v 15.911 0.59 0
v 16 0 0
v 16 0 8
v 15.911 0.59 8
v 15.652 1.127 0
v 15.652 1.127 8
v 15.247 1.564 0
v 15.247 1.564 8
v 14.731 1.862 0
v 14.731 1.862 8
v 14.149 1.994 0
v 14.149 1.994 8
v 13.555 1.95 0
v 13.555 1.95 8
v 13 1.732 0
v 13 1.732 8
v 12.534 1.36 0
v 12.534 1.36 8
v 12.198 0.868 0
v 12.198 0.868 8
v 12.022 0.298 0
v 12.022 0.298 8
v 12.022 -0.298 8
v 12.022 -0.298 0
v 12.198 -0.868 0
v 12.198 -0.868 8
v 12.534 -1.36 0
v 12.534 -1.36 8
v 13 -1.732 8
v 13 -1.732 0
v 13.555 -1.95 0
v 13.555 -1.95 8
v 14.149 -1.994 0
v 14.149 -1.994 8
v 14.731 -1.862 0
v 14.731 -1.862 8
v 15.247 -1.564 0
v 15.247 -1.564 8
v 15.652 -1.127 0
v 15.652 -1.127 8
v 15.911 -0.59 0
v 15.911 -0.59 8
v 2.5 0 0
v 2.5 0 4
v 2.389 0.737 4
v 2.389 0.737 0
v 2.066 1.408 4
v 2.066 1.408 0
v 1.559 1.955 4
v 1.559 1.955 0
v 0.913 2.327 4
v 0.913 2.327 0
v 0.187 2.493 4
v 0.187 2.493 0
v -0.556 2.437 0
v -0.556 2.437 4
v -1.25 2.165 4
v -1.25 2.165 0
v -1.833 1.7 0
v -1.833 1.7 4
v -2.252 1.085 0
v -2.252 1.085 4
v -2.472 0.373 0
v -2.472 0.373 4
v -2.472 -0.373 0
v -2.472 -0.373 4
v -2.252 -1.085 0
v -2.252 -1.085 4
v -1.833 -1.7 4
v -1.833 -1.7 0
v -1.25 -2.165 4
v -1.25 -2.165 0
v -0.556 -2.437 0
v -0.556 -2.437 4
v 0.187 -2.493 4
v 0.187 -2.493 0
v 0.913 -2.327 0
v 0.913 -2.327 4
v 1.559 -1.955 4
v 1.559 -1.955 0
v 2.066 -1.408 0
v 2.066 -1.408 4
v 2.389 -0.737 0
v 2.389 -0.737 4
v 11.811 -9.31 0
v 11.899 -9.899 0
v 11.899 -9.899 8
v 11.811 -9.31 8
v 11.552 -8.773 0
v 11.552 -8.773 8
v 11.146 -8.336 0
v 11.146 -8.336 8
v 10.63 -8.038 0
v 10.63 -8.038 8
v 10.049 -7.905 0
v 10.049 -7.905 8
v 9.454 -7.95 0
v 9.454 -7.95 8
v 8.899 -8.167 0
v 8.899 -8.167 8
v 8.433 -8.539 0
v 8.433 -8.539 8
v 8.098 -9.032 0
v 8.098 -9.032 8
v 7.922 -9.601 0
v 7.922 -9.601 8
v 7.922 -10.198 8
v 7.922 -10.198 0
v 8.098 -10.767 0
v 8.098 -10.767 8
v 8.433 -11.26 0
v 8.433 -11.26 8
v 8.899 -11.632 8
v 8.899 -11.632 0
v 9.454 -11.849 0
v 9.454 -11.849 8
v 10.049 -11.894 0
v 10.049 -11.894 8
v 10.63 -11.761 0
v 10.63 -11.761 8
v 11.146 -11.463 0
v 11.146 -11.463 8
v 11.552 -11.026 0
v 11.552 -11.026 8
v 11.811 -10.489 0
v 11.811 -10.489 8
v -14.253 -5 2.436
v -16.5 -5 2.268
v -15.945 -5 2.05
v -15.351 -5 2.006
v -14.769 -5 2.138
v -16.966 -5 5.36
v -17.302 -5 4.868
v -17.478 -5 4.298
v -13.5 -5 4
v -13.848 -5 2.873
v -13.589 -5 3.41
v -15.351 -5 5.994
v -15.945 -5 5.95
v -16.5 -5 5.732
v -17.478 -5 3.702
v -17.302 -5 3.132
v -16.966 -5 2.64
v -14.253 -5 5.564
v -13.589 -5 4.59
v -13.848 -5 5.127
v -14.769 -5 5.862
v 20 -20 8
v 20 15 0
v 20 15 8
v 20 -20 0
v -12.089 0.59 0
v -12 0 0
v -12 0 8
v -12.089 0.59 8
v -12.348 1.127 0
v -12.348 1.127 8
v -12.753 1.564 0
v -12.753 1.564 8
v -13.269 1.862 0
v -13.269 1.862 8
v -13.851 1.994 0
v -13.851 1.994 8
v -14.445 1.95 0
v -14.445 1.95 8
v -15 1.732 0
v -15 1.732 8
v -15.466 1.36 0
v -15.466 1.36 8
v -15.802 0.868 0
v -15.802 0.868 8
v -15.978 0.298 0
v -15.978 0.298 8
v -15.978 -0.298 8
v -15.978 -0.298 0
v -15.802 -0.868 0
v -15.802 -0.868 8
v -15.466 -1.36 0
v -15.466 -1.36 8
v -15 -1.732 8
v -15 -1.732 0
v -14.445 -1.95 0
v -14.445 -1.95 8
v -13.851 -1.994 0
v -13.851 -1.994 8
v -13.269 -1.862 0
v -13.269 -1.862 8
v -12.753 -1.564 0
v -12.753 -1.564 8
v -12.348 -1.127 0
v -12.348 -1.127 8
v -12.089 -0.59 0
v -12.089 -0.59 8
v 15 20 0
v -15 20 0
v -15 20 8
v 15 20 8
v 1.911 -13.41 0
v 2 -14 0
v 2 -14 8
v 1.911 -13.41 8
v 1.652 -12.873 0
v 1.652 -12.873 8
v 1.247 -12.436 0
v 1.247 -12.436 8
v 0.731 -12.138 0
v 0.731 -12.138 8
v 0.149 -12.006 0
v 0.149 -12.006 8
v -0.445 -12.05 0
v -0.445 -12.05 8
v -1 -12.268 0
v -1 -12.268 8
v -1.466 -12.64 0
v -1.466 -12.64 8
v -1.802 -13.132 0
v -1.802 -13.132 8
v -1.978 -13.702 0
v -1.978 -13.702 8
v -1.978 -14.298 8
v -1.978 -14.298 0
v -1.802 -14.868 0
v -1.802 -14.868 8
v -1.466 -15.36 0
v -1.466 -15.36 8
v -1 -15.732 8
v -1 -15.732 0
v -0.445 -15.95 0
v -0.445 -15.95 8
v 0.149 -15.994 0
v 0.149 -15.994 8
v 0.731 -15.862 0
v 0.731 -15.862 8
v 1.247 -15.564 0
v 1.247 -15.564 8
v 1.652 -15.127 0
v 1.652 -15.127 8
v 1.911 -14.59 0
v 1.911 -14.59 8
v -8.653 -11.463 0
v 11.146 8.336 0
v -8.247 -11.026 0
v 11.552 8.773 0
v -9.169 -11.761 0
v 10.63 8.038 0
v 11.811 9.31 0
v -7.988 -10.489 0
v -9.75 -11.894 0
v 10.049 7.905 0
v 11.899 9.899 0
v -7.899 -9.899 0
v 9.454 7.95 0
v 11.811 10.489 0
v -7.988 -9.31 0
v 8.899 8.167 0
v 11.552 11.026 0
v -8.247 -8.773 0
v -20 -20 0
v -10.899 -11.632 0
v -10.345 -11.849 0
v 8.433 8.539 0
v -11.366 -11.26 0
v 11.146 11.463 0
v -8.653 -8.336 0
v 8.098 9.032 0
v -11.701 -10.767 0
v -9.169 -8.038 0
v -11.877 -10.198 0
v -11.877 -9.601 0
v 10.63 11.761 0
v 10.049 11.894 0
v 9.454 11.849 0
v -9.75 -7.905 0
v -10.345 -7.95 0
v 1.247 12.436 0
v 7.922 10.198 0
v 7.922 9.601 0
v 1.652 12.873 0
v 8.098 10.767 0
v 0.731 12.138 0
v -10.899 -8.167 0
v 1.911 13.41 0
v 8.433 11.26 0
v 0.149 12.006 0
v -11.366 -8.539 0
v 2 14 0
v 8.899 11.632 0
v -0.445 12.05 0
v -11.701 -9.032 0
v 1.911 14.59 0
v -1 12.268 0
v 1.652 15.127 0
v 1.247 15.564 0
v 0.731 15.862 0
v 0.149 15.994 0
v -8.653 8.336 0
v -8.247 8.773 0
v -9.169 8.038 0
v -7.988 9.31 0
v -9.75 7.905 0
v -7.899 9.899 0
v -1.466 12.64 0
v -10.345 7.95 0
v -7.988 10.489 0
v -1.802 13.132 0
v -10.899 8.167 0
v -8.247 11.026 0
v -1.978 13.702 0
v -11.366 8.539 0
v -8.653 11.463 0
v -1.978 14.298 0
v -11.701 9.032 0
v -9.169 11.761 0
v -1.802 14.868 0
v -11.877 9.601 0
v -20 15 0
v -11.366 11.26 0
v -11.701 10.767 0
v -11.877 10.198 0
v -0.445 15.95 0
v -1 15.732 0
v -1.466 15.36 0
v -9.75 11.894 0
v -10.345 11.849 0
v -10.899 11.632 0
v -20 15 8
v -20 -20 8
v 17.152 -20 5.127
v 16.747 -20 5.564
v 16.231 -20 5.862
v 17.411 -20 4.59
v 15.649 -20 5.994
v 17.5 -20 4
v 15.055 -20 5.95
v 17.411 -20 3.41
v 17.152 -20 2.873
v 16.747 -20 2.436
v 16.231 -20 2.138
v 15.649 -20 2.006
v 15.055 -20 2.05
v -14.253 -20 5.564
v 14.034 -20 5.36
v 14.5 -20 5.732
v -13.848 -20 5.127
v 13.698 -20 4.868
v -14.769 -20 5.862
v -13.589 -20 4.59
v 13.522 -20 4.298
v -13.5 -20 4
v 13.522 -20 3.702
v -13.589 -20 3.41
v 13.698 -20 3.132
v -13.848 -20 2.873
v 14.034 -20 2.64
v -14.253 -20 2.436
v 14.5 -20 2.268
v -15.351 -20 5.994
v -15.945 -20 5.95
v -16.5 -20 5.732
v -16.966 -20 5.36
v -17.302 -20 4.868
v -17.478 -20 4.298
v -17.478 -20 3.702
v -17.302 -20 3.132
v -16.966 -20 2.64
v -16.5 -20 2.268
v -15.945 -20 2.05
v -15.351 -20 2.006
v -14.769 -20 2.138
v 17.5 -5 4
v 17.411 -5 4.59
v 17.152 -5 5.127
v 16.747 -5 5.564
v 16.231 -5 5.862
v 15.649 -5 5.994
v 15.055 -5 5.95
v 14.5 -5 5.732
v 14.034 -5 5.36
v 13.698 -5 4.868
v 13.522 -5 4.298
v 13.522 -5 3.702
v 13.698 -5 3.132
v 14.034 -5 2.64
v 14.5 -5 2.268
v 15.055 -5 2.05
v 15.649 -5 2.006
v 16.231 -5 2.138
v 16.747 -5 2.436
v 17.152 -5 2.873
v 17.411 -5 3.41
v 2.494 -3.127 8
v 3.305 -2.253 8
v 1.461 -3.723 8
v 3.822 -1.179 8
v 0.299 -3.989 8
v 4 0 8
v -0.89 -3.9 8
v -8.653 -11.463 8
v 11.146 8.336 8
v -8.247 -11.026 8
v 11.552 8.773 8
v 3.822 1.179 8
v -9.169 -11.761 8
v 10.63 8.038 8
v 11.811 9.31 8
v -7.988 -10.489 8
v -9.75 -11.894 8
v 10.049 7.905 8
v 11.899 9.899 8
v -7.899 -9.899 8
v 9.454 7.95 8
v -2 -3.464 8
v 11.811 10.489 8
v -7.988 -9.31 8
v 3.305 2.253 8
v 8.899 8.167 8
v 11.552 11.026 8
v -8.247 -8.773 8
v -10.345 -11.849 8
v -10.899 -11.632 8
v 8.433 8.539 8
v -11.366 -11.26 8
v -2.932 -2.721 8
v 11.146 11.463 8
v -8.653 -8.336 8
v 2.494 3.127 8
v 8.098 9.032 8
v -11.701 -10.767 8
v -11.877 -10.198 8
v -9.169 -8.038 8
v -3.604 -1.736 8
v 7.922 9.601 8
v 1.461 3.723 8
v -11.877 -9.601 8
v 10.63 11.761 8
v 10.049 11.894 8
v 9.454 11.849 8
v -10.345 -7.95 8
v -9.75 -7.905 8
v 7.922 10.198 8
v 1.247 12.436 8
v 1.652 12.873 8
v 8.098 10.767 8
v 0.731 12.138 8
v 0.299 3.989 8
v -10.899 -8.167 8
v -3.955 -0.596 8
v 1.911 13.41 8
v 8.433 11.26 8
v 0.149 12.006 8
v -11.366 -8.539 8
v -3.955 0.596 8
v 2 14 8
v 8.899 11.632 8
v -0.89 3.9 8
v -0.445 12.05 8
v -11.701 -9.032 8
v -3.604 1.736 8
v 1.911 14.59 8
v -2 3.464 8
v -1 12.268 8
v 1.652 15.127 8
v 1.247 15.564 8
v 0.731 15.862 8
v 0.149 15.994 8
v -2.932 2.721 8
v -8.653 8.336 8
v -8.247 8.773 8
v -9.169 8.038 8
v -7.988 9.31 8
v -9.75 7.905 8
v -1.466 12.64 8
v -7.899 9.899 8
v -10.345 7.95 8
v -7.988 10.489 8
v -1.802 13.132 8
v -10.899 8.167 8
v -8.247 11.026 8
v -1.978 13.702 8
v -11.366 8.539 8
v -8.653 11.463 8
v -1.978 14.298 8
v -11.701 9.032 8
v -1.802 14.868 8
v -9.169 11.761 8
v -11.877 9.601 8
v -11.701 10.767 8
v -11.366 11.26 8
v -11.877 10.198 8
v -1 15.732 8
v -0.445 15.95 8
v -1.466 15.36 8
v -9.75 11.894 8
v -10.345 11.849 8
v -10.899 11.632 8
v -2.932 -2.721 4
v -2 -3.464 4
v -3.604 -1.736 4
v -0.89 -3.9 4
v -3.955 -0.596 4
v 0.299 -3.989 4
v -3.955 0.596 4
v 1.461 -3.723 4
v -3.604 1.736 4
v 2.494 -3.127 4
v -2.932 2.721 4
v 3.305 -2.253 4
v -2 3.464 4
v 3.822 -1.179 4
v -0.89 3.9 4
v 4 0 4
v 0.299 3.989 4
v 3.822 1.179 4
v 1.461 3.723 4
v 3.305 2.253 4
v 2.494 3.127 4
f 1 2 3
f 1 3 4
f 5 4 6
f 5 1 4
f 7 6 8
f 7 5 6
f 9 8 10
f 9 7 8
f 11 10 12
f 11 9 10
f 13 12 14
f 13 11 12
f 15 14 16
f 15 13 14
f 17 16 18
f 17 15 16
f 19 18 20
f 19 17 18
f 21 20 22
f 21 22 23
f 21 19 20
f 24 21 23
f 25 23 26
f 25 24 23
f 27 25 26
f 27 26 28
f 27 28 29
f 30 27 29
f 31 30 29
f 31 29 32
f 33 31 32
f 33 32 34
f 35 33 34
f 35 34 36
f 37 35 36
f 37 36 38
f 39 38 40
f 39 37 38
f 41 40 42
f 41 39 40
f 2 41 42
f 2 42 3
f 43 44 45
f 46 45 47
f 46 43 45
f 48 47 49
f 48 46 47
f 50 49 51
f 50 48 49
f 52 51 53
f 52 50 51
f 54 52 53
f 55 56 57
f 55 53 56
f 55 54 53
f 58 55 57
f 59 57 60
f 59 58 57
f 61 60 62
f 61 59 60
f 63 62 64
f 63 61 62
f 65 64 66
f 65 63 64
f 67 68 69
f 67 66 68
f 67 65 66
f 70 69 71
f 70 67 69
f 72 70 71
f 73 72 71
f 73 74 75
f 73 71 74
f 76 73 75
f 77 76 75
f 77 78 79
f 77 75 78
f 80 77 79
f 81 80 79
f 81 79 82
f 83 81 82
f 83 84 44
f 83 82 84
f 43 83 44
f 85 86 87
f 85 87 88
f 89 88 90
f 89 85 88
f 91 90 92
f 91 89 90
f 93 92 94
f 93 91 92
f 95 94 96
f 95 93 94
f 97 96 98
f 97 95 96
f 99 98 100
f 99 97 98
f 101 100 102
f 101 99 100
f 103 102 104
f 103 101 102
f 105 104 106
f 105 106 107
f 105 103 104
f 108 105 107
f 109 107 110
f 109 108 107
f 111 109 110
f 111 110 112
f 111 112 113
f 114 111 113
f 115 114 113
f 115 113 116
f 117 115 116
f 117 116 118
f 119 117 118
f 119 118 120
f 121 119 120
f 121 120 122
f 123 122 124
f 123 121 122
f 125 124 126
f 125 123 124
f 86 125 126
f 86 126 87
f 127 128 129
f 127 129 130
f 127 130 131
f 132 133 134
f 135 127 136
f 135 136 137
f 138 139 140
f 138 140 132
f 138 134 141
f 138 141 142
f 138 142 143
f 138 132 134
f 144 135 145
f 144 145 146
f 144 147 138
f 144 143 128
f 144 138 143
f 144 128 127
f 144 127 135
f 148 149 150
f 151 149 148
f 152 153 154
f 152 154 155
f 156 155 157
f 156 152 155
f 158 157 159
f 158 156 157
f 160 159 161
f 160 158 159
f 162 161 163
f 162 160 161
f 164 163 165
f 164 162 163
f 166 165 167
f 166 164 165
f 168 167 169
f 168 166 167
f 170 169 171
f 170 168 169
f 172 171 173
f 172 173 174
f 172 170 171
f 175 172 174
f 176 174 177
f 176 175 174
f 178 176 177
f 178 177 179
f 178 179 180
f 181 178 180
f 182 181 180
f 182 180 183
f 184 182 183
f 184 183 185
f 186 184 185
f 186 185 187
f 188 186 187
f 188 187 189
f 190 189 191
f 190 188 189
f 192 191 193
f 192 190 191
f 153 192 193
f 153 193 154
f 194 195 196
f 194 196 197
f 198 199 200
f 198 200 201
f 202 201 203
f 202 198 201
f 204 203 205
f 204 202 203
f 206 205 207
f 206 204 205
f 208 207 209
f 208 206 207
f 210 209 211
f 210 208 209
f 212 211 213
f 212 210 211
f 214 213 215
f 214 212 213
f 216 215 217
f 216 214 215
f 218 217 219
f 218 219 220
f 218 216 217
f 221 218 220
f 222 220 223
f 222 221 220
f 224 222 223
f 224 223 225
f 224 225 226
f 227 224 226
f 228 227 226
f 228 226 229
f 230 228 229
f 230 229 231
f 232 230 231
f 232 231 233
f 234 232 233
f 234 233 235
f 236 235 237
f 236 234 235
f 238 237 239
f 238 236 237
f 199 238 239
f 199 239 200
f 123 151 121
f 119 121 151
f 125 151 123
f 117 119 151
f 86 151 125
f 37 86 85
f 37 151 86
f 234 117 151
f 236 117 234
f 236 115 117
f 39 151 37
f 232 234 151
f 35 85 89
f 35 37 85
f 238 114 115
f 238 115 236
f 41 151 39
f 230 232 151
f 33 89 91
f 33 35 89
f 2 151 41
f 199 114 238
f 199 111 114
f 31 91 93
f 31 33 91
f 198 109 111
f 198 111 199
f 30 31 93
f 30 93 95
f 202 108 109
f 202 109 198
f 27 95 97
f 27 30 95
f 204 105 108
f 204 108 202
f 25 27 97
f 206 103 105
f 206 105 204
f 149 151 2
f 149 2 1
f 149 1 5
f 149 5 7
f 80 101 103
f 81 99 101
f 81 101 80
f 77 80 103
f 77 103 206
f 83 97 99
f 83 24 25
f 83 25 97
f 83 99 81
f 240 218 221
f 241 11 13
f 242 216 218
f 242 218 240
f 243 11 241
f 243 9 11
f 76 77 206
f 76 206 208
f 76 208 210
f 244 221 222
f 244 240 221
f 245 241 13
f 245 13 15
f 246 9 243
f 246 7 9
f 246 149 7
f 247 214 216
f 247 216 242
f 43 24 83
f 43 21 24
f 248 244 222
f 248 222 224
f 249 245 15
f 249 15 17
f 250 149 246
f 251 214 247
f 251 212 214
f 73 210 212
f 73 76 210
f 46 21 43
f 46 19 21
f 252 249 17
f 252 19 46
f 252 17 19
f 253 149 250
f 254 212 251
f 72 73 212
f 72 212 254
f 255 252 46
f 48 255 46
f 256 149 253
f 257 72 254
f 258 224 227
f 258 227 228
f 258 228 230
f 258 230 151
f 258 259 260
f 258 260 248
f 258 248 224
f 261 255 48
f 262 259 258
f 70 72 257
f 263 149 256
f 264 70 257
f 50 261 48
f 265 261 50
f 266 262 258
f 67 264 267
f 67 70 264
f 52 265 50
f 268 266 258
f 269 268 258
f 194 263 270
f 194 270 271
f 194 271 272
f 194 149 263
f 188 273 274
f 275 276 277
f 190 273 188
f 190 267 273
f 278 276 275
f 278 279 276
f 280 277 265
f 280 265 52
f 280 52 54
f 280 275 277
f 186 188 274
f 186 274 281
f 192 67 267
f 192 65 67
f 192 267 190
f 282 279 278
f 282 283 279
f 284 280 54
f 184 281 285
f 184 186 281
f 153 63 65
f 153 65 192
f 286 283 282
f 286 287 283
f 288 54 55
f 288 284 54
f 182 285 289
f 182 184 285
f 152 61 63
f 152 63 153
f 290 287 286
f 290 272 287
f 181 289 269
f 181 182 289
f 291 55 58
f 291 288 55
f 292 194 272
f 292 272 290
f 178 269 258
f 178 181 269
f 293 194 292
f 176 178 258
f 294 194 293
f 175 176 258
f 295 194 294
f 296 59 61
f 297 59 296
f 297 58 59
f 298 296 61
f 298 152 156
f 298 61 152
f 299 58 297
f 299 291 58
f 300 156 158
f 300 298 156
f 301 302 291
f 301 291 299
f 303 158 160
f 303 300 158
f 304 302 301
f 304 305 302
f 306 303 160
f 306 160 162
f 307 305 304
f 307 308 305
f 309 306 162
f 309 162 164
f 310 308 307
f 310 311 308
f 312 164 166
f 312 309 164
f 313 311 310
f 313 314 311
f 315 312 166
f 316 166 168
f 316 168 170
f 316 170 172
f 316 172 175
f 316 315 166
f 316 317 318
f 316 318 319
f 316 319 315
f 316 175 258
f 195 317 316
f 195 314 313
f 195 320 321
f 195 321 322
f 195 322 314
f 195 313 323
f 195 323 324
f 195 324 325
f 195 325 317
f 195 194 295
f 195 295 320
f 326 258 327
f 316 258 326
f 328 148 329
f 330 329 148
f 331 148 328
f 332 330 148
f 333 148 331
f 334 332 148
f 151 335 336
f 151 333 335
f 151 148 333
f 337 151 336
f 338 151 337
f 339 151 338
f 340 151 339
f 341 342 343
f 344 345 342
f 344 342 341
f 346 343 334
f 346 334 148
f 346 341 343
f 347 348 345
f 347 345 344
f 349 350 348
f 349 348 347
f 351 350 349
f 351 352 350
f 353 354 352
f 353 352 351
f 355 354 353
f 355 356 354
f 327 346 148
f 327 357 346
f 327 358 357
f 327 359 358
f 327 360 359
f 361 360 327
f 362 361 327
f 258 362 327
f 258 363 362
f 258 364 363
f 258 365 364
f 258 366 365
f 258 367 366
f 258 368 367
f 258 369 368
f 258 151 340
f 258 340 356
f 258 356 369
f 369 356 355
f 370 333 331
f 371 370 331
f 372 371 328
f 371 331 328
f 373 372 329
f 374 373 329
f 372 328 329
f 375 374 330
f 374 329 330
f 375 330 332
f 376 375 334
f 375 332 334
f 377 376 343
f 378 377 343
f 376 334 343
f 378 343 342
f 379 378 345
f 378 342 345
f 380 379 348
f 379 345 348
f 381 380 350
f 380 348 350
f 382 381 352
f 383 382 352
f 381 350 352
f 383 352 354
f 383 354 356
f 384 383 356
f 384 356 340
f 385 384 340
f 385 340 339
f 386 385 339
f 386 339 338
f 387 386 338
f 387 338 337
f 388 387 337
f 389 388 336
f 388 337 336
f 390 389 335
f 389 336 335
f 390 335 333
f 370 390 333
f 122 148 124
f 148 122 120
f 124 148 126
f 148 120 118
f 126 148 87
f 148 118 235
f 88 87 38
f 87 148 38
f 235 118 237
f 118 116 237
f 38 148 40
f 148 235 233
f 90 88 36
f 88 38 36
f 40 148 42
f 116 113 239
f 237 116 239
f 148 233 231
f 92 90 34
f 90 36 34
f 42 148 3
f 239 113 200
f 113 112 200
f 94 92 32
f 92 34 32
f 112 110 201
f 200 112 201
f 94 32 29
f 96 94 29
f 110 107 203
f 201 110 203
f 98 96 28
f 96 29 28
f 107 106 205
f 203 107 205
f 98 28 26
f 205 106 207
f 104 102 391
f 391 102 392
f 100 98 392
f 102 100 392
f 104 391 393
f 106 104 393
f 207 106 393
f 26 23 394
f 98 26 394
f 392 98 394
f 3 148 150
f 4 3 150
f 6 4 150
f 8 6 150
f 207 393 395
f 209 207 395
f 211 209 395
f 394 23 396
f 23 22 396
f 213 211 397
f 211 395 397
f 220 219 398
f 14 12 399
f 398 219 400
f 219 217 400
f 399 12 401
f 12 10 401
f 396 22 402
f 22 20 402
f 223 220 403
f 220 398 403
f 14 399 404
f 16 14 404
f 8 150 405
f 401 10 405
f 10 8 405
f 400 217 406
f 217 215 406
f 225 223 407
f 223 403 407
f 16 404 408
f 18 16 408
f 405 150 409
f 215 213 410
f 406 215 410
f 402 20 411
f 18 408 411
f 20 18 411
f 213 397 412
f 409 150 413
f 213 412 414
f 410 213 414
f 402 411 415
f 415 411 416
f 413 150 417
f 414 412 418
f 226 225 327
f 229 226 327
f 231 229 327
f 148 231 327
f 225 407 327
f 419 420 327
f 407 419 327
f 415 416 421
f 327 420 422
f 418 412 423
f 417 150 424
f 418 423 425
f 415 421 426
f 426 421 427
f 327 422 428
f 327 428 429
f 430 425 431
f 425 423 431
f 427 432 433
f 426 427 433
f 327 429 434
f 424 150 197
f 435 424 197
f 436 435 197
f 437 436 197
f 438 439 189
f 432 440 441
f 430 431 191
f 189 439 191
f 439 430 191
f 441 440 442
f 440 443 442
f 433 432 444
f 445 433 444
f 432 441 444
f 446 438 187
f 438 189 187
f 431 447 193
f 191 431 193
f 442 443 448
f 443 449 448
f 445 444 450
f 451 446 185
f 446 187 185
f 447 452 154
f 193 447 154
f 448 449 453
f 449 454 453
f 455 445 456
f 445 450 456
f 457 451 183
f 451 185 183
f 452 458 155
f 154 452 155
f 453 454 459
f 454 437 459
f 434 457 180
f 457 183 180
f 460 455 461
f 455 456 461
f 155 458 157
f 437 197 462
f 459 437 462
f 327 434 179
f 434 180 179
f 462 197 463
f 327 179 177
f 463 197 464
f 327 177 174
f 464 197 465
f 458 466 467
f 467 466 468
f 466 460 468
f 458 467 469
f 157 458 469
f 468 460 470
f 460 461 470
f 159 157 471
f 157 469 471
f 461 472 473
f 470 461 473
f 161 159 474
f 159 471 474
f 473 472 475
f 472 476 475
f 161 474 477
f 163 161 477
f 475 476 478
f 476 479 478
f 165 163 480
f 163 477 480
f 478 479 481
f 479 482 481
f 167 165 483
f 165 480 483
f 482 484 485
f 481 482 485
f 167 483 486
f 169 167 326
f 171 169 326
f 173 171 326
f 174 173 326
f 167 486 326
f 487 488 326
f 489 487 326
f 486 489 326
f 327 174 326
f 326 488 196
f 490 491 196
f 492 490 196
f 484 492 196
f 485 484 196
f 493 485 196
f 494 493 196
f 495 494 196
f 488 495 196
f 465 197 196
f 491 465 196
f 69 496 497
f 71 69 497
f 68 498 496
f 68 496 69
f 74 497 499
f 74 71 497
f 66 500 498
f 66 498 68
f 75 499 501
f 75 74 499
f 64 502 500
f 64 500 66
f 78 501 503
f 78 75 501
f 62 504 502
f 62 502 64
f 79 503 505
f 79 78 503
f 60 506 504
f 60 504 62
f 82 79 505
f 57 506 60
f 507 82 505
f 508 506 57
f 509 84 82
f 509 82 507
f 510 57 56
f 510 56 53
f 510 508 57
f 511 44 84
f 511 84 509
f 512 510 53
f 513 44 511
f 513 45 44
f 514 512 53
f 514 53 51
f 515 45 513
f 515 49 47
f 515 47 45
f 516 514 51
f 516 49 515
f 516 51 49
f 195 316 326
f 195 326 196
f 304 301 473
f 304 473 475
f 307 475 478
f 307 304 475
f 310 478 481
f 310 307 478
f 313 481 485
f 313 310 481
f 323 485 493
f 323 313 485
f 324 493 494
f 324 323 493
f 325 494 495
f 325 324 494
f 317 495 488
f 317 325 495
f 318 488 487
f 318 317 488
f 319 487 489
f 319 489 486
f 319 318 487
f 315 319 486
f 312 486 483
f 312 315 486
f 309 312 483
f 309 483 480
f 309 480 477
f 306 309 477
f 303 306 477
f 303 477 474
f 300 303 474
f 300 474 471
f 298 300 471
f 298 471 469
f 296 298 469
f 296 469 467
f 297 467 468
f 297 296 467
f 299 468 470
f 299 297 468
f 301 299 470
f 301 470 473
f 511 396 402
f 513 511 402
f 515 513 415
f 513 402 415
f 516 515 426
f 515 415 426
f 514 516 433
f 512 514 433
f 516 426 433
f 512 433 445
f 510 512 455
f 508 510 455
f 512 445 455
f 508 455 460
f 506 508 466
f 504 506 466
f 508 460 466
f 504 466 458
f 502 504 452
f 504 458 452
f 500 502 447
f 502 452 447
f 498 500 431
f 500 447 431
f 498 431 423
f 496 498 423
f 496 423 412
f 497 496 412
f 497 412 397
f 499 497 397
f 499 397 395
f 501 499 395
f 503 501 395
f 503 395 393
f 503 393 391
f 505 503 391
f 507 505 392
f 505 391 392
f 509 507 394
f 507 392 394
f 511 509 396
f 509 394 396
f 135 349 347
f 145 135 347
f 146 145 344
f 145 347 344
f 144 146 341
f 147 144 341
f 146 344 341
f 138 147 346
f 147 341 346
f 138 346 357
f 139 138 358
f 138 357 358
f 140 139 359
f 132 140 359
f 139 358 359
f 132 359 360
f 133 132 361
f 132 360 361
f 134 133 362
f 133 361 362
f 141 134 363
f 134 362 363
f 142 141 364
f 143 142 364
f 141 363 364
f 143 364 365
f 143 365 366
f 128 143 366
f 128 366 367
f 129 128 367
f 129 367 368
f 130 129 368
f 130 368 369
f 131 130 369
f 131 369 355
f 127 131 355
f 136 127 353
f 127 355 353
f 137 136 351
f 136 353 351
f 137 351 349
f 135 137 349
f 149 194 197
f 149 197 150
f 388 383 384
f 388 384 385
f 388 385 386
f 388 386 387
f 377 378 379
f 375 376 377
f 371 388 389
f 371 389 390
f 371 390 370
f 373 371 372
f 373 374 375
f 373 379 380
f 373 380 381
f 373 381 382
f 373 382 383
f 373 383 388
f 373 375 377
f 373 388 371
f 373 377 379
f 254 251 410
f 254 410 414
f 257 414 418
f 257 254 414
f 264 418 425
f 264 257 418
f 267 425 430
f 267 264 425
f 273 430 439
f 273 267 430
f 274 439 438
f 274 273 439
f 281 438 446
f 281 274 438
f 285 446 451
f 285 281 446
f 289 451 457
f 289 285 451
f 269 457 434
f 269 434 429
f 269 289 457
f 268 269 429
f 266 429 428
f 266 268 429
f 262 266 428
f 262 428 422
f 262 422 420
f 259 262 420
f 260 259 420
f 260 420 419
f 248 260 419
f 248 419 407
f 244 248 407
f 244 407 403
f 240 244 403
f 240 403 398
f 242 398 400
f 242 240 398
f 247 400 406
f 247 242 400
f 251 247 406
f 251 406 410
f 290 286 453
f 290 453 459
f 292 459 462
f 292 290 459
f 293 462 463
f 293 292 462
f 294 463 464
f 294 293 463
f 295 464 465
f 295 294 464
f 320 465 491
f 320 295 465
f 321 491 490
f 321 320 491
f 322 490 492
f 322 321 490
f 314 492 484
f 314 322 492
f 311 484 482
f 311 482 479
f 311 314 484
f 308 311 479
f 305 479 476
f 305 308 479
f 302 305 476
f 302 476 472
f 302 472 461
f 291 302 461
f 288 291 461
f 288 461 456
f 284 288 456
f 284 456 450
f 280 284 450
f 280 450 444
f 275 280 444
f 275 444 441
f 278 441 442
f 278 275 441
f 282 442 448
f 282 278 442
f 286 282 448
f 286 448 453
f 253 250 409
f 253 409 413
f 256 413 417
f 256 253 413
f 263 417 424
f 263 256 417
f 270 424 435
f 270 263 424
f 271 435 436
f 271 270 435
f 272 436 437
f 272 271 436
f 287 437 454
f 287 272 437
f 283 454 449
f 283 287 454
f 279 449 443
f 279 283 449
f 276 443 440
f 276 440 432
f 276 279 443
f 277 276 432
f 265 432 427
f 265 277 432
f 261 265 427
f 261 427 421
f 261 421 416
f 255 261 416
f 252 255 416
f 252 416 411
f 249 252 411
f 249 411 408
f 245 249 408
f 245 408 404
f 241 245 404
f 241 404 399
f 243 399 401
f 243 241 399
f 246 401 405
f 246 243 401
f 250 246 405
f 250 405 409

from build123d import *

# Parameters (mm, degrees)
ESQUISSE1_R      = 2.5
ESQUISSE1_R_2    = 2
EXTRUSION1_DEPTH = 8
ESQUISSE2_R      = 4
EXTRUSION2_DEPTH = 4
ESQUISSE3_R      = 2
EXTRUSION3_DEPTH = 15


with BuildPart() as part:
    # Esquisse1 → Extrusion1 (new body)
    with BuildSketch(Plane.XY):
        Polygon((-20, -20), (-20, 15), (-15, 20), (15, 20), (20, 15), (20, -20), align=None)
        Circle(ESQUISSE1_R, mode=Mode.SUBTRACT)
        with Locations((9.899494937, 9.899494937)):
            Circle(ESQUISSE1_R_2, mode=Mode.SUBTRACT)
        with Locations((0, 14)):
            Circle(ESQUISSE1_R_2, mode=Mode.SUBTRACT)
        with Locations((14, 0)):
            Circle(ESQUISSE1_R_2, mode=Mode.SUBTRACT)
        with Locations((9.899494937, -9.899494937)):
            Circle(ESQUISSE1_R_2, mode=Mode.SUBTRACT)
        with Locations((0, -14)):
            Circle(ESQUISSE1_R_2, mode=Mode.SUBTRACT)
        with Locations((-9.899494937, -9.899494937)):
            Circle(ESQUISSE1_R_2, mode=Mode.SUBTRACT)
        with Locations((-14, 0)):
            Circle(ESQUISSE1_R_2, mode=Mode.SUBTRACT)
        with Locations((-9.899494937, 9.899494937)):
            Circle(ESQUISSE1_R_2, mode=Mode.SUBTRACT)
    extrude(amount=EXTRUSION1_DEPTH)

    # Esquisse2 → Extrusion2 (cut)
    with BuildSketch(Plane.XY.offset(8)):
        Circle(ESQUISSE2_R)
    extrude(amount=-EXTRUSION2_DEPTH, mode=Mode.SUBTRACT)

    # Esquisse3 → Extrusion3 (cut)
    with BuildSketch(Plane.XZ.offset(20)):
        with Locations((-15.5, 4)):
            Circle(ESQUISSE3_R)
        with Locations((15.5, 4)):
            Circle(ESQUISSE3_R)
    extrude(amount=-EXTRUSION3_DEPTH, mode=Mode.SUBTRACT)


solid = part.part
